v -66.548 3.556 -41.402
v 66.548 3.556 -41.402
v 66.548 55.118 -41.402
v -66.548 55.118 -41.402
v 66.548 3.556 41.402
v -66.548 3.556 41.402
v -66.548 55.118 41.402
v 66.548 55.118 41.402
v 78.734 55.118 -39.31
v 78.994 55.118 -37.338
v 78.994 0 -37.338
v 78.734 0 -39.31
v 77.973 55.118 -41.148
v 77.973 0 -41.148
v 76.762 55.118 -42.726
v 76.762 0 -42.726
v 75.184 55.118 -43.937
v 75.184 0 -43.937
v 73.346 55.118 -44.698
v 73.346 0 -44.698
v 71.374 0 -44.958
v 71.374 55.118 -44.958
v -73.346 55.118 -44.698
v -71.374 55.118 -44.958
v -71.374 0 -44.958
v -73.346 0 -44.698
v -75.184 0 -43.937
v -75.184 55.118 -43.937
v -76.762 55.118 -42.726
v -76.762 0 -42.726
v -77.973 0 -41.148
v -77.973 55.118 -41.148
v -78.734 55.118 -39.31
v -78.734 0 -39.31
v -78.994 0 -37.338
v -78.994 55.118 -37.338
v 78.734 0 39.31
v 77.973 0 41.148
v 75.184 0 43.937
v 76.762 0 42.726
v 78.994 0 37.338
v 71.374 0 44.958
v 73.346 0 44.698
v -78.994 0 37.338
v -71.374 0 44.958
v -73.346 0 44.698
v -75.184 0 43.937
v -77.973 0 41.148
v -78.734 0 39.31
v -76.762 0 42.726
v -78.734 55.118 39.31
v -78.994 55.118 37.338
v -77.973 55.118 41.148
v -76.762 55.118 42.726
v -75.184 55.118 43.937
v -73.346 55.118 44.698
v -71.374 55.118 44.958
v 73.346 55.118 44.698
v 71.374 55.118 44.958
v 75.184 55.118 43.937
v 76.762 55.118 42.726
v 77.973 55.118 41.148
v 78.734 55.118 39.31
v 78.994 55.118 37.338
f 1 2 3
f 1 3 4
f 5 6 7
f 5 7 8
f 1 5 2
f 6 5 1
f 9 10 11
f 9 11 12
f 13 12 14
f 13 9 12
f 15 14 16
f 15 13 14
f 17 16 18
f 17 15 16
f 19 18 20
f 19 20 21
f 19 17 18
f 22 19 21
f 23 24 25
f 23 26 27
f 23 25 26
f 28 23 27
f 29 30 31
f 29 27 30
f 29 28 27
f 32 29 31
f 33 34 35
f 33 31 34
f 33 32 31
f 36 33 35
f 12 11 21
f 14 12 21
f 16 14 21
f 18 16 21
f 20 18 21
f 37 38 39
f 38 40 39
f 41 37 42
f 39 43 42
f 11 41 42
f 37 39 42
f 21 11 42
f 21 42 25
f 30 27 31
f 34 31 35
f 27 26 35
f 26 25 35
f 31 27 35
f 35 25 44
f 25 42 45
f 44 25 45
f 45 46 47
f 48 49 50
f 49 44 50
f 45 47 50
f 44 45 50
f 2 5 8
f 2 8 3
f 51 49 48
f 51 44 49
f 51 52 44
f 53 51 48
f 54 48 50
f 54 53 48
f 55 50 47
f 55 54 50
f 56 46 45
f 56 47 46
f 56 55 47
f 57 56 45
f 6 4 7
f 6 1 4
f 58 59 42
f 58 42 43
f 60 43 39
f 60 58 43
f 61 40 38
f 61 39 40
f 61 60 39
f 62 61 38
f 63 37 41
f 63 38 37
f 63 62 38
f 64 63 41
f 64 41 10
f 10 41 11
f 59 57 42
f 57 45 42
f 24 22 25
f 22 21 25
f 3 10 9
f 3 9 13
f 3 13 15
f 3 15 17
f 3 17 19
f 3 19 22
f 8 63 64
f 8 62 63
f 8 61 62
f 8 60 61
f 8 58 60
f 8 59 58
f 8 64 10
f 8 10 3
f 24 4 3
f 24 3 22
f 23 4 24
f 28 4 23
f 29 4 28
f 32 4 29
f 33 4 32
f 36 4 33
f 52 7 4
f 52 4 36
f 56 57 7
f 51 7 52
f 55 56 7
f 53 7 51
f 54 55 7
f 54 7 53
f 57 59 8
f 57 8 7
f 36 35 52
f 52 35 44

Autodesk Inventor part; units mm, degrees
ref_plane "YZ Plane" through (0, 0, 0) normal (1, 0, 0) x (0, 1, 0)
ref_plane "XZ Plane" through (0, 0, 0) normal (0, 1, 0) x (-1, 0, 0)
ref_plane "XY Plane" through (0, 0, 0) normal (0, 0, 1) x (1, 0, 0)
sketch "Sketch1" plane through (0, 0, 0) normal (0, 1, 0) x (-1, 0, 0)
  line L0 (-78.994, -44.958) -> (78.994, -44.958)
  line L1 (78.994, -44.958) -> (78.994, 44.958)
  line L2 (78.994, 44.958) -> (-78.994, 44.958)
  line L3 (-78.994, 44.958) -> (-78.994, -44.958)
  line L4 (-78.994, -44.958) -> (78.994, 44.958) construction
  line L5 (78.994, -44.958) -> (-78.994, 44.958) construction
  point P0 (0, 0)
  dimension "d0" = 89.916
  dimension "d1" = 157.988
extrude "Extrusion1" add sketch "Sketch1" along normal blind 55.118
fillet "Fillet1" radius 7.62 4 edges at (78.994, 27.559, 44.958) (78.994, 27.559, -44.958) (-78.994, 27.559, 44.958) (-78.994, 27.559, -44.958)
shell "Shell1" thickness 3.556 removed faces 1 at (23.7913, 55.118, -14.986)
sketch "Sketch2" plane through (-71.374, 3.556, 41.402) normal (0, 1, 0) x (1, 0, 0)
  line L0 (0, 0) -> (142.748, 0) projected
  line L1 (137.922, 0) -> (137.922, 82.804)
  line L2 (0, 82.804) -> (142.748, 82.804) projected
  line L3 (4.826, 82.804) -> (4.826, 0)
  line L4 (142.748, 0) -> (0, 0) projected
  line L5 (-4.064, 4.064) -> (-4.064, 78.74) projected
  line L6 (146.812, 78.74) -> (146.812, 4.064) projected
  arc A0 (0, 82.804) -> (-4.064, 78.74) centre (0, 78.74) ccw projected
  line L7 (-4.064, 78.74) -> (-4.064, 4.064) projected
  arc A1 (-4.064, 4.064) -> (0, 0) centre (0, 4.064) ccw projected
  line L8 (0, 0) -> (142.748, 0) projected
  arc A2 (142.748, 0) -> (146.812, 4.064) centre (142.748, 4.064) ccw projected
  line L9 (146.812, 4.064) -> (146.812, 78.74) projected
  arc A3 (146.812, 78.74) -> (142.748, 82.804) centre (142.748, 78.74) ccw projected
  line L10 (142.748, 82.804) -> (0, 82.804) projected
  point P0 (71.374, 41.402)
  point P1 (4.826, 0)
  point P2 (0, 82.804)
  point P3 (-4.064, 78.74)
  dimension "d6" = 133.096
  dimension "d7" = 8.89
  dimension "d8" = 8.89
extrude "Extrusion2" add sketch "Sketch2" along normal up to surface (51.562 mm away) contours A1 L5 A0 L2 L3 L0 | L1 L2 A3 L6 A2 L0
equation "\"d7\" = d8"
properties part number "project_box"
